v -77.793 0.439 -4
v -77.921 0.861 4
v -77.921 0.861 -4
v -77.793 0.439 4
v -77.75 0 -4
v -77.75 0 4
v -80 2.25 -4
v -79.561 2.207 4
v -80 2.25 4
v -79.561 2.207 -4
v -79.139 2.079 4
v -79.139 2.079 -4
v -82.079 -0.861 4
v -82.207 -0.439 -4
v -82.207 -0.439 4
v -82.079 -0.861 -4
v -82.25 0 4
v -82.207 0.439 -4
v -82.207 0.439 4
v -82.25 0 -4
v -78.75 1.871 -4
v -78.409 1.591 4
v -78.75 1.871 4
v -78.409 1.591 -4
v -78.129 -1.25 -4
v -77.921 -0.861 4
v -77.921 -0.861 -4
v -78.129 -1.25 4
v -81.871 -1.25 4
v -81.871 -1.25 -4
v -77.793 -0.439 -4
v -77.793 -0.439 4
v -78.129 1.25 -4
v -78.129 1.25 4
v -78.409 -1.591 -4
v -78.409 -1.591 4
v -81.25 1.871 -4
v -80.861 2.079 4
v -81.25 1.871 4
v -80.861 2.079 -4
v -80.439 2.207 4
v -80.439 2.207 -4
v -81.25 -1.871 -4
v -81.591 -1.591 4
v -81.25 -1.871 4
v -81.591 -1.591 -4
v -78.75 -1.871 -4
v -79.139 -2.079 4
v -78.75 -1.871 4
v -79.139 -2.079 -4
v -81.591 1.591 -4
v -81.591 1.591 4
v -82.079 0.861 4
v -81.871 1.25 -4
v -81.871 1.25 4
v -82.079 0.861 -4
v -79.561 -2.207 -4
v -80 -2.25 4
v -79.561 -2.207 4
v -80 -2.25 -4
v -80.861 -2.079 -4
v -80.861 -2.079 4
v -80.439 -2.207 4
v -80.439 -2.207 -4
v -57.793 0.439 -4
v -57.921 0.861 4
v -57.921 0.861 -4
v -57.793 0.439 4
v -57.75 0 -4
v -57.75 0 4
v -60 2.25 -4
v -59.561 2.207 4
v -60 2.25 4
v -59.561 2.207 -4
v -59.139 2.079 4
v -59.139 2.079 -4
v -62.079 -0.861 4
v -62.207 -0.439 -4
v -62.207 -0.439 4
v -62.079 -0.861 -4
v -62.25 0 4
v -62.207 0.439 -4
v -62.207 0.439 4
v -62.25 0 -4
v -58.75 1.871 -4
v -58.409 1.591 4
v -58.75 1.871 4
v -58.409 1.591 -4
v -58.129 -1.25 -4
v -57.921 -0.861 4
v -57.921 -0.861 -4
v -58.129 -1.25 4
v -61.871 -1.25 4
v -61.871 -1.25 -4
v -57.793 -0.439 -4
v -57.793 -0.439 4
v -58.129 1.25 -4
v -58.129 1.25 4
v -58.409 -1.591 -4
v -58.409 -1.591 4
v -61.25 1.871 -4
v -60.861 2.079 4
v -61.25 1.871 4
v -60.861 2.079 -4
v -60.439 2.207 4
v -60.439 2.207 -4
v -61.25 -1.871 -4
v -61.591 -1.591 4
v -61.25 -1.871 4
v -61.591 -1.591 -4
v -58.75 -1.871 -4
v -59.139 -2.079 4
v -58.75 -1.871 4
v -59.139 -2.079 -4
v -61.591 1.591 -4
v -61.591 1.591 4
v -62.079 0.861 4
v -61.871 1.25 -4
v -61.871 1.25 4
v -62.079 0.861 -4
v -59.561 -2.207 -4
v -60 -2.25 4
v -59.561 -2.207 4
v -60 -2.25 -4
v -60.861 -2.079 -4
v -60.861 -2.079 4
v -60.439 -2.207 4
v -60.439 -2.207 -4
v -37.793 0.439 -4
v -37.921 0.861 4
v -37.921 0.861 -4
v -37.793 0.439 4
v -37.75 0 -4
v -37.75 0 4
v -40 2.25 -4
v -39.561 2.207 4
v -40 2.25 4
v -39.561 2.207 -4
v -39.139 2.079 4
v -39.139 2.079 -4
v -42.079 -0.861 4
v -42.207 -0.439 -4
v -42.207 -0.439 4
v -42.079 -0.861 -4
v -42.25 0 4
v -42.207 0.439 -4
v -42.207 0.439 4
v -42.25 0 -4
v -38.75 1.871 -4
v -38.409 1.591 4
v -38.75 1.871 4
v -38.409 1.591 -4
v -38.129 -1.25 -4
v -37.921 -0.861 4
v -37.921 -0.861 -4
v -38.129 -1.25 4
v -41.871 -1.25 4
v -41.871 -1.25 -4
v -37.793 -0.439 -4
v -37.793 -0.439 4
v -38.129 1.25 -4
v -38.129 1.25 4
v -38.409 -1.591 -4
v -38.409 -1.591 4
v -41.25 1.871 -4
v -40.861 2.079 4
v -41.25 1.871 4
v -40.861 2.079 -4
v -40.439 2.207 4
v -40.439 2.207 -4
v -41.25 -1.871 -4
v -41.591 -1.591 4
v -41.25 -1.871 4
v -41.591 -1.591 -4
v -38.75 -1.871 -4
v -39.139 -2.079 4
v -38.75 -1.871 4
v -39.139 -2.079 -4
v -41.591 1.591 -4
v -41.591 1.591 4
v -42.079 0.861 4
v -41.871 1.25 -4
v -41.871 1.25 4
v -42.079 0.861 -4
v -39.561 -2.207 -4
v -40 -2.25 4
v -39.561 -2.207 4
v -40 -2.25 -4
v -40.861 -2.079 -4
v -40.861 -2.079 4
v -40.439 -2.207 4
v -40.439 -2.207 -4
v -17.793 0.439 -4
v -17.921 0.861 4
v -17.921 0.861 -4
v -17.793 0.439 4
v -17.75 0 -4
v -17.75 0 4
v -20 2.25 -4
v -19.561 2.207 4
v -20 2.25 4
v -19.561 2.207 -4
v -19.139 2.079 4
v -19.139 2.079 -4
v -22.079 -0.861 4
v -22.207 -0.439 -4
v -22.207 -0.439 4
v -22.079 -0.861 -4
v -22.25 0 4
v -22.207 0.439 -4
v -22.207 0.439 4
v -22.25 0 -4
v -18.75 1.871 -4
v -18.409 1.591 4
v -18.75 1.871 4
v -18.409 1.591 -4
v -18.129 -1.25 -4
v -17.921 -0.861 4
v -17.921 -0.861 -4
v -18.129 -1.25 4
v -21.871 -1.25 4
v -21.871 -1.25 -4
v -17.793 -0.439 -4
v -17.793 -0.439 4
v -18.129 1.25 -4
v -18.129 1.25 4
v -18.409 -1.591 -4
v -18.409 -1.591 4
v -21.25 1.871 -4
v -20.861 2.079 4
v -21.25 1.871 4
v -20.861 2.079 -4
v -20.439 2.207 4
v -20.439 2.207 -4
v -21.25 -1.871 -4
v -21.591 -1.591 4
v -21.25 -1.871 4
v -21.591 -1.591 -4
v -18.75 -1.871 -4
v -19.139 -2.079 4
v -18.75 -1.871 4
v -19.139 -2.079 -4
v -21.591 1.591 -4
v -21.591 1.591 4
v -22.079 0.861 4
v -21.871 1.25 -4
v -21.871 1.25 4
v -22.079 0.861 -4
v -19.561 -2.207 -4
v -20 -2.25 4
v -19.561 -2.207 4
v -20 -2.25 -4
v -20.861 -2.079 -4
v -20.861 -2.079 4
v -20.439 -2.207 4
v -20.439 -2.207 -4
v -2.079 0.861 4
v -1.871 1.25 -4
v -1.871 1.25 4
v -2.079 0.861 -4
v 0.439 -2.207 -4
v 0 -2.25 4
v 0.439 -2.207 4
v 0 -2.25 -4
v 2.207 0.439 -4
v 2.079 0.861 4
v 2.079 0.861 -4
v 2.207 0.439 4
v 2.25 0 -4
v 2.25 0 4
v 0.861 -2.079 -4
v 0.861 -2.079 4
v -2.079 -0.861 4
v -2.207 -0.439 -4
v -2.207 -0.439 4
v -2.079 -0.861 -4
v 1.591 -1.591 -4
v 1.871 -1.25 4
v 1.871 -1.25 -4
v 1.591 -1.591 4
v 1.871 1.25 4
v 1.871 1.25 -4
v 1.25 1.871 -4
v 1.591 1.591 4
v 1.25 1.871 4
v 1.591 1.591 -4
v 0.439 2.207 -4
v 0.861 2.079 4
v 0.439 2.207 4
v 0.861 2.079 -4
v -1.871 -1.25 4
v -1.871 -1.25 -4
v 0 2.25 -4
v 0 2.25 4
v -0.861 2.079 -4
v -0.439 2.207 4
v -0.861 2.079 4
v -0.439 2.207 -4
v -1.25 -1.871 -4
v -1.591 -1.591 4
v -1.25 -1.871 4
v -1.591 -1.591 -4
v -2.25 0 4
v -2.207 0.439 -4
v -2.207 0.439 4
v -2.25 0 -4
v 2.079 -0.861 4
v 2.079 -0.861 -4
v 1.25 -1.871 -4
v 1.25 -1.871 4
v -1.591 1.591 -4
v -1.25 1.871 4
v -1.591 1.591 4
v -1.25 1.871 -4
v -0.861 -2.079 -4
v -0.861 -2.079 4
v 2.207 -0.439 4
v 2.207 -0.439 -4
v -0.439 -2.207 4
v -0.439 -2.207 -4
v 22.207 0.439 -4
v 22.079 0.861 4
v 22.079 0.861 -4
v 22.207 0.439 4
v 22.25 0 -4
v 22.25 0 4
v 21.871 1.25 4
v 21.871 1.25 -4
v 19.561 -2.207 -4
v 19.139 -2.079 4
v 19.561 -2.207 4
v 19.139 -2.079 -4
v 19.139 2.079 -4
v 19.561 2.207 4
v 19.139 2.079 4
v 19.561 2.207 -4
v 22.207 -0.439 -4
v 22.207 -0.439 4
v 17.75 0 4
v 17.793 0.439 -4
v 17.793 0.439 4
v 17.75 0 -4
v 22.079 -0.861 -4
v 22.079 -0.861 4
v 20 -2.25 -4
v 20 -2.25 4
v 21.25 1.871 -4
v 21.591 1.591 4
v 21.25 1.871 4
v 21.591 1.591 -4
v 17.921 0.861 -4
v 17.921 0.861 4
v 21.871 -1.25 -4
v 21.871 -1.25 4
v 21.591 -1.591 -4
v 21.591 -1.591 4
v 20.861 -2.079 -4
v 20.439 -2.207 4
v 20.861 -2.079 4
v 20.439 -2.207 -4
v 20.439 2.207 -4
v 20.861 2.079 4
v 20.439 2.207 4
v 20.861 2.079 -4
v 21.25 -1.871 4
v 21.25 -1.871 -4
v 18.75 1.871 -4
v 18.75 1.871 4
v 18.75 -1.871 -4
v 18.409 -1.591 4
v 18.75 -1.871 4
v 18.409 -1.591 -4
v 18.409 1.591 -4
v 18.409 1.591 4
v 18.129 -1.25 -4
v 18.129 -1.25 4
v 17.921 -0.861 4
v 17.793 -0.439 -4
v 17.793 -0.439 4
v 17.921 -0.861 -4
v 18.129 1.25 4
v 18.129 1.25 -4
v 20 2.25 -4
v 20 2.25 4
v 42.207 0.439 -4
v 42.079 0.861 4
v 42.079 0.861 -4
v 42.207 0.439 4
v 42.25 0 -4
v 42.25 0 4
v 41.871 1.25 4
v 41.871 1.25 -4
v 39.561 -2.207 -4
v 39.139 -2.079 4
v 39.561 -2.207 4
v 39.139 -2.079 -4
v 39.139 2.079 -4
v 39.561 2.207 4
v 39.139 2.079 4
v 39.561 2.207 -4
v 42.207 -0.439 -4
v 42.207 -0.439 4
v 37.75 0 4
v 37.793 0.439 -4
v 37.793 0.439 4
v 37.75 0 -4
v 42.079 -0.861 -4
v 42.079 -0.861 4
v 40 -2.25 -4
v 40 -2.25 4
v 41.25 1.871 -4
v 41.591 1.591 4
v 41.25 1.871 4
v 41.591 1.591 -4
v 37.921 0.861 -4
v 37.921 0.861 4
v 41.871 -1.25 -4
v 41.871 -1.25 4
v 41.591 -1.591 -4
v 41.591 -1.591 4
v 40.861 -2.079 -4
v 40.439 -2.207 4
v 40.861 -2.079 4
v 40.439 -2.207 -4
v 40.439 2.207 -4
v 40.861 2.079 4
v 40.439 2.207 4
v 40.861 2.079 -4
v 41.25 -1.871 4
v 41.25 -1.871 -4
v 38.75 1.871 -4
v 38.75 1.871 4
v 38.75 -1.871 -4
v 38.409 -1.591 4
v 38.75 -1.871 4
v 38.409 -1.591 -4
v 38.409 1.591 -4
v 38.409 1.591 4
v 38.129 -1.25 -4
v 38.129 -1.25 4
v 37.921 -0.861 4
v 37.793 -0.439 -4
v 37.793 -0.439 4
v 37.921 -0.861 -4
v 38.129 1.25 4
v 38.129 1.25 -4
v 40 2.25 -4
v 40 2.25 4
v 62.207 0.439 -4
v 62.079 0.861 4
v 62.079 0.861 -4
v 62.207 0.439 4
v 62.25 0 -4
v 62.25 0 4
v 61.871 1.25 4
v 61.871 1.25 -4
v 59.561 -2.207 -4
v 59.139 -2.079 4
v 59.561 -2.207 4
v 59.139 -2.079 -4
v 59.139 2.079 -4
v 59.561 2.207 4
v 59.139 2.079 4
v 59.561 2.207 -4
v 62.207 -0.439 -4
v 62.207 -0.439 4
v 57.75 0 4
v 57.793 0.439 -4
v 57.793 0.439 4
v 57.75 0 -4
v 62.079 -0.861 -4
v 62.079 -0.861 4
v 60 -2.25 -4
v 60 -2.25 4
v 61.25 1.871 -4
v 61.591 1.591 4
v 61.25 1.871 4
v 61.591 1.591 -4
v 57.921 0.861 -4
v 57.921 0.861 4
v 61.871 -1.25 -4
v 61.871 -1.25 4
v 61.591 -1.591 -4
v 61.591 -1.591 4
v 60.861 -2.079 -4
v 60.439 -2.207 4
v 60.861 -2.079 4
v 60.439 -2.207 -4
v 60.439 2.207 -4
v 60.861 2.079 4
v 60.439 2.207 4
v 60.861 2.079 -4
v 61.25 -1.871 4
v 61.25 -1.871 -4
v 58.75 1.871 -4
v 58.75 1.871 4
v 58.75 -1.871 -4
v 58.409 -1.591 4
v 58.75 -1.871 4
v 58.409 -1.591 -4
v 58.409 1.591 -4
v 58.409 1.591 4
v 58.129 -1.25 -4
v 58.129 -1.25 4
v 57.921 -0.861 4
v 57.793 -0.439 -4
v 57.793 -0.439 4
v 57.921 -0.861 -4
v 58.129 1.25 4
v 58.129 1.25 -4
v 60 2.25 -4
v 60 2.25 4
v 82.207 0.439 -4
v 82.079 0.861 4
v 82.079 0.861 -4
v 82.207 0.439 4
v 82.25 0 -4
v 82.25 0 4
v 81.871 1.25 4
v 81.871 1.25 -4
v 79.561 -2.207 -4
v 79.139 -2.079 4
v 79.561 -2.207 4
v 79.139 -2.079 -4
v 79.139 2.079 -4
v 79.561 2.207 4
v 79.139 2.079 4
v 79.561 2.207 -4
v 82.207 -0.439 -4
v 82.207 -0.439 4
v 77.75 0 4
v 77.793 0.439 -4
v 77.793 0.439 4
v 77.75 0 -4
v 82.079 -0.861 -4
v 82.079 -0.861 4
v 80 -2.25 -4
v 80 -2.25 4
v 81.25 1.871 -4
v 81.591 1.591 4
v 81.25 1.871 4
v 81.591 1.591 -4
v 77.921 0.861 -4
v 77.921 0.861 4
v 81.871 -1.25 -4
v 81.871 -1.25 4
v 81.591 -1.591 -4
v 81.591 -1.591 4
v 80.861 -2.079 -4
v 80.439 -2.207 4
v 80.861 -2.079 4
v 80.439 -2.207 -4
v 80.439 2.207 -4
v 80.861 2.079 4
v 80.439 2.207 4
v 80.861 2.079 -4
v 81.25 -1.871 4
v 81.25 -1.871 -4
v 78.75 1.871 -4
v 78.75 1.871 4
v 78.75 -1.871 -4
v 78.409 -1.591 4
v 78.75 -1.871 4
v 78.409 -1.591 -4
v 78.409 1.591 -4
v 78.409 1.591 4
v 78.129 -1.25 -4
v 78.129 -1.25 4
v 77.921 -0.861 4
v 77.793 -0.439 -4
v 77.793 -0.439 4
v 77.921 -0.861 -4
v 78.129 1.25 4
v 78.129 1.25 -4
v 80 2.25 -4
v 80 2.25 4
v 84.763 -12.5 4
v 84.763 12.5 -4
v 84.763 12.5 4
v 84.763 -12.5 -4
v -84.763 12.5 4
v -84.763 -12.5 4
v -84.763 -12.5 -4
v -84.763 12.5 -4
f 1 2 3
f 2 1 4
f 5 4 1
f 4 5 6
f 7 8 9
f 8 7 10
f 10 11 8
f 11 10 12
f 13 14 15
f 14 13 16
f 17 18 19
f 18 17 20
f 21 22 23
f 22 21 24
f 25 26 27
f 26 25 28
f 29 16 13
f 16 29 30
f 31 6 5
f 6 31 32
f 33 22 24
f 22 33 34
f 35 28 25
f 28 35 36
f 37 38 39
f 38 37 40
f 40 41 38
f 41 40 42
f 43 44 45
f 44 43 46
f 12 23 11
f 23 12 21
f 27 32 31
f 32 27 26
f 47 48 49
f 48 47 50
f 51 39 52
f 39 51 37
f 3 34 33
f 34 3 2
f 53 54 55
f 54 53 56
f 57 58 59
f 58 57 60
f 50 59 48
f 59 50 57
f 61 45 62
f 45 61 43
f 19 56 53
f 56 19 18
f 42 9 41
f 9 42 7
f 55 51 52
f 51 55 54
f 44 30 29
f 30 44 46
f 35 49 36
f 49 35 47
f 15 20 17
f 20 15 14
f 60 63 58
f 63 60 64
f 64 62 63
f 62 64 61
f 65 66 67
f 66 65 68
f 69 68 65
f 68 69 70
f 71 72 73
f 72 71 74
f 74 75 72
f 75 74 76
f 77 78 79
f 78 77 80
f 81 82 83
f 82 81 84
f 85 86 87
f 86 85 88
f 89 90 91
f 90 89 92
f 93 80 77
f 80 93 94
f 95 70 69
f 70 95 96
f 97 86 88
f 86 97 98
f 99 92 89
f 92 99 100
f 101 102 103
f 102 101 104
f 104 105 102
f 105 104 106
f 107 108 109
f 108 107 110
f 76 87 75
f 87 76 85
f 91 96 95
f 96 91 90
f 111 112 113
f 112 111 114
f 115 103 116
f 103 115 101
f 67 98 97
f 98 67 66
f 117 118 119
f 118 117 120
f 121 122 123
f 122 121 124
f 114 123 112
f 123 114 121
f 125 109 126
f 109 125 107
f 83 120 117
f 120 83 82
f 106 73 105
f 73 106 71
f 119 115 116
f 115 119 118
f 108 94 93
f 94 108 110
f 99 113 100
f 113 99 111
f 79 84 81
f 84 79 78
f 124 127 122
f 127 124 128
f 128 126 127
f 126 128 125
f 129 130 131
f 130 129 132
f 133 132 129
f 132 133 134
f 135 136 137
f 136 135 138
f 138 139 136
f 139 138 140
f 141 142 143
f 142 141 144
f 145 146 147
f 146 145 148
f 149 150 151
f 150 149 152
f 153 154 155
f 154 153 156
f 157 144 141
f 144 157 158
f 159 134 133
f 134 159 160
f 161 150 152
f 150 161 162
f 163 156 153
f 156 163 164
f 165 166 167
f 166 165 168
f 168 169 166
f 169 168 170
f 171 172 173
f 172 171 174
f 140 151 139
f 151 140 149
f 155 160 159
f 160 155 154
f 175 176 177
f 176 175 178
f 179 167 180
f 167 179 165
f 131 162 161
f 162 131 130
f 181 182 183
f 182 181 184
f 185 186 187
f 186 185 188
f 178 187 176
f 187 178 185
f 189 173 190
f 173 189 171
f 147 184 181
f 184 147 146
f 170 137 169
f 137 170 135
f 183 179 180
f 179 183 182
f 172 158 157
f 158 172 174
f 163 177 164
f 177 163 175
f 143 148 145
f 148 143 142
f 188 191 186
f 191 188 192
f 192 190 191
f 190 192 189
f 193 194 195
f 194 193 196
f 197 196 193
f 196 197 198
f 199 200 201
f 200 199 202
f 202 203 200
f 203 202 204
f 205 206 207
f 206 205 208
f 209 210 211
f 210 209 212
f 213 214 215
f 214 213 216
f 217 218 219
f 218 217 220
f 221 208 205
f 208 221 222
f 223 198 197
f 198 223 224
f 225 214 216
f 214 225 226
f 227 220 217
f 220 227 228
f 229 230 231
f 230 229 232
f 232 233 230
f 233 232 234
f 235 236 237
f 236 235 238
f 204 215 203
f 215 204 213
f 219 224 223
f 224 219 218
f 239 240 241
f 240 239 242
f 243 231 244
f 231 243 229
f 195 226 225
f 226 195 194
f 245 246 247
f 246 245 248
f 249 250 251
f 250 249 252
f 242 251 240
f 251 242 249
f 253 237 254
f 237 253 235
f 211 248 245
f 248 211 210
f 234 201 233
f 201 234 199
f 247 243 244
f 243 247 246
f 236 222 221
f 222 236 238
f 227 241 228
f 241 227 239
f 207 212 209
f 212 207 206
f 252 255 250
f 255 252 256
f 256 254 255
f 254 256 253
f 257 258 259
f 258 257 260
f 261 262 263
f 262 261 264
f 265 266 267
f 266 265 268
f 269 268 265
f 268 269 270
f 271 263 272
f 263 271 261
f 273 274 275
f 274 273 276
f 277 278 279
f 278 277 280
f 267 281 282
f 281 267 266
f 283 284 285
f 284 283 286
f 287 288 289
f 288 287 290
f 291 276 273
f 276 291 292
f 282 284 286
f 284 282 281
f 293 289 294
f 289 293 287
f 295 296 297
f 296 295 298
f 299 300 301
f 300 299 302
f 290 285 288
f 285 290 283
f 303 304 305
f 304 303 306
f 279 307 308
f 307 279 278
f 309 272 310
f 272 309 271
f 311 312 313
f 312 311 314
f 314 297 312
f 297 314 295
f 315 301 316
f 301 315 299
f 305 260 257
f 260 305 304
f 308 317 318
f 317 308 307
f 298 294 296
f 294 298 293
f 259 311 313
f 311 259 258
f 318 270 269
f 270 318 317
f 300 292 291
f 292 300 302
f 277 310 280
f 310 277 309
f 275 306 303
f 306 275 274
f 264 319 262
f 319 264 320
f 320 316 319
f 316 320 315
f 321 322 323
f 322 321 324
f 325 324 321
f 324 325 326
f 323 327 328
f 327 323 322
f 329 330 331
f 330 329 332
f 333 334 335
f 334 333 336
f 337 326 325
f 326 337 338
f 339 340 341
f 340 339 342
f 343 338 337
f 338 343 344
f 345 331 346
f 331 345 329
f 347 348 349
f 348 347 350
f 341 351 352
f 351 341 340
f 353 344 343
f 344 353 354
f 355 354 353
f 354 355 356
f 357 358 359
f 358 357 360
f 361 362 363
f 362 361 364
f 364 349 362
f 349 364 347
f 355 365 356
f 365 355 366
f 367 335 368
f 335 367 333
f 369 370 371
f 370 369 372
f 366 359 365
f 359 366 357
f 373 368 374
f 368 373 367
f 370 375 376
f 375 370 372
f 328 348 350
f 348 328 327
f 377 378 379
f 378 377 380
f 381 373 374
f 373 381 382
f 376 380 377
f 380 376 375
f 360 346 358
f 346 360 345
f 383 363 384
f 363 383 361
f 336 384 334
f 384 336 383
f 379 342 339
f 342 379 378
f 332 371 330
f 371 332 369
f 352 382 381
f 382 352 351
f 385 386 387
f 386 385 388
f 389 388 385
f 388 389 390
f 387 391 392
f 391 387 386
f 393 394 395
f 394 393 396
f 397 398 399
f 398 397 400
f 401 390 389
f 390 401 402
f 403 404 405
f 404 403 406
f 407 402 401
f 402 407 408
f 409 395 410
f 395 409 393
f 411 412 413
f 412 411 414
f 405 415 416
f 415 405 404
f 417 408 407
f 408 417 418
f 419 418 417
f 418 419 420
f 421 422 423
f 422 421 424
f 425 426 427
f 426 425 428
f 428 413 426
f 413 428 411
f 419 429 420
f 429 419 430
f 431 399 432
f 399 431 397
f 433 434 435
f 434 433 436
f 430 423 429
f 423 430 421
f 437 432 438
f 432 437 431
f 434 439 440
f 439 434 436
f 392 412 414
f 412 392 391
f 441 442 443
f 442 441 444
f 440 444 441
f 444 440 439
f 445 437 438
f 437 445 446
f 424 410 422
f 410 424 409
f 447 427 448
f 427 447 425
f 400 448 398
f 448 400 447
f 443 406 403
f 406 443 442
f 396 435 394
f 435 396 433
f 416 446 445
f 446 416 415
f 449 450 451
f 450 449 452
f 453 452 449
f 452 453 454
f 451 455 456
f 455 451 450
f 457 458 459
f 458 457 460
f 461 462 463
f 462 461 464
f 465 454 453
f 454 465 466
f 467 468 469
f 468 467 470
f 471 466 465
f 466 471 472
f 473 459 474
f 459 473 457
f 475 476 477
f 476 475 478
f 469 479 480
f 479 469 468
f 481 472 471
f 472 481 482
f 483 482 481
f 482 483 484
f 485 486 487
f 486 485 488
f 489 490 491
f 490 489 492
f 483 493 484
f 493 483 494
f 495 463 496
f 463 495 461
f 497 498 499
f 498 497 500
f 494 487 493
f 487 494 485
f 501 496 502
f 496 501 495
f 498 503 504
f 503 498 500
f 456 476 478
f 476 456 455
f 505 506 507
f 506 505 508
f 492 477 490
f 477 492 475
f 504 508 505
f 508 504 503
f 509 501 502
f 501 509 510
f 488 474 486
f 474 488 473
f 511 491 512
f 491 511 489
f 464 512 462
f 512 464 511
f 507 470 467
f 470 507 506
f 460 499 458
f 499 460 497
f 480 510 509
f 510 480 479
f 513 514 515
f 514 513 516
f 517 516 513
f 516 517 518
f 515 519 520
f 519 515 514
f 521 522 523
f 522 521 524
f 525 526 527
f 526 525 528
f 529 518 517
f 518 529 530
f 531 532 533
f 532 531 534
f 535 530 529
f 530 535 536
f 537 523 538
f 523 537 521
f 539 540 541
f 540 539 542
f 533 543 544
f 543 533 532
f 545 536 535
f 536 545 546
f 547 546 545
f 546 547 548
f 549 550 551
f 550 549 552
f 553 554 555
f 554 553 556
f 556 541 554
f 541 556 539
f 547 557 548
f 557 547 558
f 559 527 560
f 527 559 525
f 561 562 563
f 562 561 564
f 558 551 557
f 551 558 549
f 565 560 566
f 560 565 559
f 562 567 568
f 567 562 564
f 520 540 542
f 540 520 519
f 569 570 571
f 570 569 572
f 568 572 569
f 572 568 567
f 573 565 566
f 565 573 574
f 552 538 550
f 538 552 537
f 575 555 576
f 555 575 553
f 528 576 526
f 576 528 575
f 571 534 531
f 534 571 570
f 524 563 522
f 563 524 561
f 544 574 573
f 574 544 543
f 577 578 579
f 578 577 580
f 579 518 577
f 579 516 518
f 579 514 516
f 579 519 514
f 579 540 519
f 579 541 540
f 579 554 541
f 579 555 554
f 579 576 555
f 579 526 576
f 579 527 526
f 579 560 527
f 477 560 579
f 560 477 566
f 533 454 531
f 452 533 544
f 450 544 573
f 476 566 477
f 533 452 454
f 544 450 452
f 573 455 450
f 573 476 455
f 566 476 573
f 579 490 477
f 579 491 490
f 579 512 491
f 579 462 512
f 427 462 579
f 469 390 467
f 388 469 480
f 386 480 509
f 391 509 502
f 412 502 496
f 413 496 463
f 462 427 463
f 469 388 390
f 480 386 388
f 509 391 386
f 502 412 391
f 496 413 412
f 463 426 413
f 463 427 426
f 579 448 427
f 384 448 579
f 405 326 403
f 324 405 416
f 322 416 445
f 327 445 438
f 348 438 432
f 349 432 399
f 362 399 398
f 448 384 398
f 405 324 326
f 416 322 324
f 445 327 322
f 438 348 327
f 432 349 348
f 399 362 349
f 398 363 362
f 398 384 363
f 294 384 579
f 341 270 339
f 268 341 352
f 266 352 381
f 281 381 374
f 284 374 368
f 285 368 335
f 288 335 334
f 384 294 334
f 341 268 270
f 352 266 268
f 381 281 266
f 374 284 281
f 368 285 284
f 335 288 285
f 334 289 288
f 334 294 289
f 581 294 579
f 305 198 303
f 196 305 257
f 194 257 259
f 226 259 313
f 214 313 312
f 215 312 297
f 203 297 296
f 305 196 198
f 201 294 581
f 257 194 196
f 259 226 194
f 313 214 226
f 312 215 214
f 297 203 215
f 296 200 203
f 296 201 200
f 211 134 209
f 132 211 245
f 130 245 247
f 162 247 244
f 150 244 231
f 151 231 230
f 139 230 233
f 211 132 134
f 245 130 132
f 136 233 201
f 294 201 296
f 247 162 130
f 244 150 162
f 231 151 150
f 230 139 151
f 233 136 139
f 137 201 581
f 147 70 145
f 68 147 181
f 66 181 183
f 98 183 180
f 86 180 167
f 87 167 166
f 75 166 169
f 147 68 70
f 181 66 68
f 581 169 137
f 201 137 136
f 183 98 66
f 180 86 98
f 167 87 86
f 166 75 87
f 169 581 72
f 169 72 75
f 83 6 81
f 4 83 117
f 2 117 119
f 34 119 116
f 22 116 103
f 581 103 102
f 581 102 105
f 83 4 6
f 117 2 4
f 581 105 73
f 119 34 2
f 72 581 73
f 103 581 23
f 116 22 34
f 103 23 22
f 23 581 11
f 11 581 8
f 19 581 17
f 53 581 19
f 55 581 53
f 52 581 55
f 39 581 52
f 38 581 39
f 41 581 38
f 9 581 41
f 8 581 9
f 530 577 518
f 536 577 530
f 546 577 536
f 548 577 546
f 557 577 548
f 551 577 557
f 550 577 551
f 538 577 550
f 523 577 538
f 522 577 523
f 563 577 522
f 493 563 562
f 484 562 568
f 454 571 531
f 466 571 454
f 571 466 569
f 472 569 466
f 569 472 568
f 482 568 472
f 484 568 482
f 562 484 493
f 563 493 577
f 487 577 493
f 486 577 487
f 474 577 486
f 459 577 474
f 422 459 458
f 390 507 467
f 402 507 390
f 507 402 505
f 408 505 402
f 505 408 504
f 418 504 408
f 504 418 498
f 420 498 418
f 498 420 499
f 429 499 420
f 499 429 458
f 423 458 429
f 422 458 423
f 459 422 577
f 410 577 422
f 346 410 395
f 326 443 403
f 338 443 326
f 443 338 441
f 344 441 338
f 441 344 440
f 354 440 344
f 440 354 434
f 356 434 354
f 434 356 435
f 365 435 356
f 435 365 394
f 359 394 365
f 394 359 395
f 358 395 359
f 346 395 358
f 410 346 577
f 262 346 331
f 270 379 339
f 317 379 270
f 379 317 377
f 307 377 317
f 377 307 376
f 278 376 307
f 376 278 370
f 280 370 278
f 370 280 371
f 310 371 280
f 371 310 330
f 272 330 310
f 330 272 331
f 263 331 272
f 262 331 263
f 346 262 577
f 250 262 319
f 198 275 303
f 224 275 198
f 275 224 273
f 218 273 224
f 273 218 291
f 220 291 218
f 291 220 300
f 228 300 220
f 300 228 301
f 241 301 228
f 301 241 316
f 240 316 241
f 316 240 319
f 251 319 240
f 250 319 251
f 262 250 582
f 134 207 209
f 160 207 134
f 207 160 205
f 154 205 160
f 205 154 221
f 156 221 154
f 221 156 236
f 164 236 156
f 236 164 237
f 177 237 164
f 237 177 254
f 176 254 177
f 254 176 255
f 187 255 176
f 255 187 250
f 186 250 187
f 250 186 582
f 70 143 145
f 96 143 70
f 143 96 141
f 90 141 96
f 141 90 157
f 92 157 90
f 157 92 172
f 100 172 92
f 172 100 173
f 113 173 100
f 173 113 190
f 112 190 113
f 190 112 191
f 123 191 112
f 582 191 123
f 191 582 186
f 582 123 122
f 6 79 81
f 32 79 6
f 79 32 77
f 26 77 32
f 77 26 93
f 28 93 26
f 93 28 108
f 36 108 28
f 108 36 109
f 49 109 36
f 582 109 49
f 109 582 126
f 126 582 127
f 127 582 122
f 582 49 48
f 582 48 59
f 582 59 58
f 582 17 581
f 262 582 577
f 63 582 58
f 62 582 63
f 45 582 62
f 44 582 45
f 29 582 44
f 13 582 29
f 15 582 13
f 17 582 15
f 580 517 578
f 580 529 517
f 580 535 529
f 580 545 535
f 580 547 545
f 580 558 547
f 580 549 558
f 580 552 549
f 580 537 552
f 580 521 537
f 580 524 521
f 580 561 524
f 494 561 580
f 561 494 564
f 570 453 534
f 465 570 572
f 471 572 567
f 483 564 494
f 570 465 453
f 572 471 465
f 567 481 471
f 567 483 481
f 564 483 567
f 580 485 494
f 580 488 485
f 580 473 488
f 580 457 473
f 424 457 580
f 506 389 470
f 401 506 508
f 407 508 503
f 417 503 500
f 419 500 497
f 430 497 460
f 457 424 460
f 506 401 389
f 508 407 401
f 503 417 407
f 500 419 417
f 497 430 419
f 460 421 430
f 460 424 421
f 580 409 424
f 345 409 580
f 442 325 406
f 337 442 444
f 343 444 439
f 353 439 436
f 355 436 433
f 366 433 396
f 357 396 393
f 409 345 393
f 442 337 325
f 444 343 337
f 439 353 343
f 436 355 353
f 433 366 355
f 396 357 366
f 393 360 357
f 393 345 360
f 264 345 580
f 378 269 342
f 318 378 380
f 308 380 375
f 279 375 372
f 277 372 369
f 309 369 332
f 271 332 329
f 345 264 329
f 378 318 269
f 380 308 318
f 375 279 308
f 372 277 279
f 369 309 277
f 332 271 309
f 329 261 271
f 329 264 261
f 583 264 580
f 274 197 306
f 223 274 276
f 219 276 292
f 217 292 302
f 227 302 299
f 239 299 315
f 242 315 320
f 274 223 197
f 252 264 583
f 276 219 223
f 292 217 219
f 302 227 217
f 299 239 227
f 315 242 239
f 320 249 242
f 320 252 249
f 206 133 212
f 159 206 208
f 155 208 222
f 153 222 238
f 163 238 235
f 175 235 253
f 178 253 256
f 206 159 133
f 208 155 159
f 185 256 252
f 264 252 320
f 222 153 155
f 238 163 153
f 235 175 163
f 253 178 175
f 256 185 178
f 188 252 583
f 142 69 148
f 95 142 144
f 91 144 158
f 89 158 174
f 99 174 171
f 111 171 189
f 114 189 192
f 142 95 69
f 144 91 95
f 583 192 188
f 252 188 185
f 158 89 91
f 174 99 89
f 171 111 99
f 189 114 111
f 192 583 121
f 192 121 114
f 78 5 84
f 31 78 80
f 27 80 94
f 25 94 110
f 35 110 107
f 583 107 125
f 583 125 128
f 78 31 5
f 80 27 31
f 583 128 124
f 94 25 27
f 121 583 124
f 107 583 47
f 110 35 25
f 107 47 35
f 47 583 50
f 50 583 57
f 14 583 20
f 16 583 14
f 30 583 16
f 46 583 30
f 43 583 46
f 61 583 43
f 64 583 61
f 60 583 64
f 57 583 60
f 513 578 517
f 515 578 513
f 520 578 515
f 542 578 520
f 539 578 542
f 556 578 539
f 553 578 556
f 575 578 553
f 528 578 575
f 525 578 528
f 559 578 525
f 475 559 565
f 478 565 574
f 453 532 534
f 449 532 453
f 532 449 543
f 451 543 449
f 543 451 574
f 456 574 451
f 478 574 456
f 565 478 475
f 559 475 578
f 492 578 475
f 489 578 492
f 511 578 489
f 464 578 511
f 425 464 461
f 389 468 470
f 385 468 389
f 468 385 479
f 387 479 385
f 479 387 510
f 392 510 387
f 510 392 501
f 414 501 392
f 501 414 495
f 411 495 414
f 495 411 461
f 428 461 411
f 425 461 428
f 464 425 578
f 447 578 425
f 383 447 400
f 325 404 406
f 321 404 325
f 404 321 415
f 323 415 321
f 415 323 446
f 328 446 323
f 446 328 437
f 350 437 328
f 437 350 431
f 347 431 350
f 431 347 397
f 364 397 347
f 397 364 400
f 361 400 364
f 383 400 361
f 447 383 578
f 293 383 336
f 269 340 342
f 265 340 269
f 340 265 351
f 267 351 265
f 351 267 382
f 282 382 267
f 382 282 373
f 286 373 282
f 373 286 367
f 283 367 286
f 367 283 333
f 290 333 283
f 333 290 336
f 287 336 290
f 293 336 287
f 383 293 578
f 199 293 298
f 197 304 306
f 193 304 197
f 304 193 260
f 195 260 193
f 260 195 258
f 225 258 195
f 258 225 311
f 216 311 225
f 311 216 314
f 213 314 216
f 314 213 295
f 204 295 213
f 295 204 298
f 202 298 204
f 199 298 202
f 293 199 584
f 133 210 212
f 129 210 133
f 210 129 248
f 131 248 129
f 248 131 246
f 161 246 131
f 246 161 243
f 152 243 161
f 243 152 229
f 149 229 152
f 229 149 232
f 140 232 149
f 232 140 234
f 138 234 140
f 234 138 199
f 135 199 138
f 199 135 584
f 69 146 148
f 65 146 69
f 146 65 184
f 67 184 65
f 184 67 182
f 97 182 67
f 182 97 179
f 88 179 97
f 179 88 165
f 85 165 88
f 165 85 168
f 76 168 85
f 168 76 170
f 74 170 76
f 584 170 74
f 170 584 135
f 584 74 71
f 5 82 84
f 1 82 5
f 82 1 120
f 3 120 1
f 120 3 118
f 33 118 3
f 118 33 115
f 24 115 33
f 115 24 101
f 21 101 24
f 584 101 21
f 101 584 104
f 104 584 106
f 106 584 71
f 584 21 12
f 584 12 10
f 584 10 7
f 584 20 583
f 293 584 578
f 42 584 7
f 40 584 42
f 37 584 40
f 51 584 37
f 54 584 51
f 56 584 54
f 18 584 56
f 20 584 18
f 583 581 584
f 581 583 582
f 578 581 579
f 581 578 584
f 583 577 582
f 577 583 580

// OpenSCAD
$fn = 32;

// ----------------------------------------------------------------------
// Hole bar, 9 x Ø4.5
// row layout, 4.7625 mm edge offset
// ----------------------------------------------------------------------

// --- parameters (mm) ---
bar_w = 25;    // bar width (Y)
bar_t = 8;     // bar thickness (Z)
holes = 9;     // holes per row
hole_d = 4.5;  // hole diameter
edge = 4.763;  // offset from the bar end to the first hole
pitch = 20;    // pitch between neighbouring holes

// --- derived feature positions (mm) ---
span = (holes - 1) * pitch;   // = 160   distance between the end holes
bar_l = span + 2 * edge;      // = 169.53   overall bar length
start_x = -bar_l / 2 + edge;  // = -80   X of the first hole
feature_centers = [
  [start_x + 0 * pitch, 0],
  [start_x + 1 * pitch, 0],
  [start_x + 2 * pitch, 0],
  [start_x + 3 * pitch, 0],
  [start_x + 4 * pitch, 0],
  [start_x + 5 * pitch, 0],
  [start_x + 6 * pitch, 0],
  [start_x + 7 * pitch, 0],
  [start_x + 8 * pitch, 0]
];   // hole centres of the first row

// bar with one row of holes, drilled from feature_centers
difference() {
  translate([-bar_l / 2, -bar_w / 2, -bar_t / 2]) cube([bar_l, bar_w, bar_t]);
  for (centre = feature_centers)
    translate([centre[0], centre[1], 0])
      cylinder(d = hole_d, h = bar_t + 2, center = true);
}
